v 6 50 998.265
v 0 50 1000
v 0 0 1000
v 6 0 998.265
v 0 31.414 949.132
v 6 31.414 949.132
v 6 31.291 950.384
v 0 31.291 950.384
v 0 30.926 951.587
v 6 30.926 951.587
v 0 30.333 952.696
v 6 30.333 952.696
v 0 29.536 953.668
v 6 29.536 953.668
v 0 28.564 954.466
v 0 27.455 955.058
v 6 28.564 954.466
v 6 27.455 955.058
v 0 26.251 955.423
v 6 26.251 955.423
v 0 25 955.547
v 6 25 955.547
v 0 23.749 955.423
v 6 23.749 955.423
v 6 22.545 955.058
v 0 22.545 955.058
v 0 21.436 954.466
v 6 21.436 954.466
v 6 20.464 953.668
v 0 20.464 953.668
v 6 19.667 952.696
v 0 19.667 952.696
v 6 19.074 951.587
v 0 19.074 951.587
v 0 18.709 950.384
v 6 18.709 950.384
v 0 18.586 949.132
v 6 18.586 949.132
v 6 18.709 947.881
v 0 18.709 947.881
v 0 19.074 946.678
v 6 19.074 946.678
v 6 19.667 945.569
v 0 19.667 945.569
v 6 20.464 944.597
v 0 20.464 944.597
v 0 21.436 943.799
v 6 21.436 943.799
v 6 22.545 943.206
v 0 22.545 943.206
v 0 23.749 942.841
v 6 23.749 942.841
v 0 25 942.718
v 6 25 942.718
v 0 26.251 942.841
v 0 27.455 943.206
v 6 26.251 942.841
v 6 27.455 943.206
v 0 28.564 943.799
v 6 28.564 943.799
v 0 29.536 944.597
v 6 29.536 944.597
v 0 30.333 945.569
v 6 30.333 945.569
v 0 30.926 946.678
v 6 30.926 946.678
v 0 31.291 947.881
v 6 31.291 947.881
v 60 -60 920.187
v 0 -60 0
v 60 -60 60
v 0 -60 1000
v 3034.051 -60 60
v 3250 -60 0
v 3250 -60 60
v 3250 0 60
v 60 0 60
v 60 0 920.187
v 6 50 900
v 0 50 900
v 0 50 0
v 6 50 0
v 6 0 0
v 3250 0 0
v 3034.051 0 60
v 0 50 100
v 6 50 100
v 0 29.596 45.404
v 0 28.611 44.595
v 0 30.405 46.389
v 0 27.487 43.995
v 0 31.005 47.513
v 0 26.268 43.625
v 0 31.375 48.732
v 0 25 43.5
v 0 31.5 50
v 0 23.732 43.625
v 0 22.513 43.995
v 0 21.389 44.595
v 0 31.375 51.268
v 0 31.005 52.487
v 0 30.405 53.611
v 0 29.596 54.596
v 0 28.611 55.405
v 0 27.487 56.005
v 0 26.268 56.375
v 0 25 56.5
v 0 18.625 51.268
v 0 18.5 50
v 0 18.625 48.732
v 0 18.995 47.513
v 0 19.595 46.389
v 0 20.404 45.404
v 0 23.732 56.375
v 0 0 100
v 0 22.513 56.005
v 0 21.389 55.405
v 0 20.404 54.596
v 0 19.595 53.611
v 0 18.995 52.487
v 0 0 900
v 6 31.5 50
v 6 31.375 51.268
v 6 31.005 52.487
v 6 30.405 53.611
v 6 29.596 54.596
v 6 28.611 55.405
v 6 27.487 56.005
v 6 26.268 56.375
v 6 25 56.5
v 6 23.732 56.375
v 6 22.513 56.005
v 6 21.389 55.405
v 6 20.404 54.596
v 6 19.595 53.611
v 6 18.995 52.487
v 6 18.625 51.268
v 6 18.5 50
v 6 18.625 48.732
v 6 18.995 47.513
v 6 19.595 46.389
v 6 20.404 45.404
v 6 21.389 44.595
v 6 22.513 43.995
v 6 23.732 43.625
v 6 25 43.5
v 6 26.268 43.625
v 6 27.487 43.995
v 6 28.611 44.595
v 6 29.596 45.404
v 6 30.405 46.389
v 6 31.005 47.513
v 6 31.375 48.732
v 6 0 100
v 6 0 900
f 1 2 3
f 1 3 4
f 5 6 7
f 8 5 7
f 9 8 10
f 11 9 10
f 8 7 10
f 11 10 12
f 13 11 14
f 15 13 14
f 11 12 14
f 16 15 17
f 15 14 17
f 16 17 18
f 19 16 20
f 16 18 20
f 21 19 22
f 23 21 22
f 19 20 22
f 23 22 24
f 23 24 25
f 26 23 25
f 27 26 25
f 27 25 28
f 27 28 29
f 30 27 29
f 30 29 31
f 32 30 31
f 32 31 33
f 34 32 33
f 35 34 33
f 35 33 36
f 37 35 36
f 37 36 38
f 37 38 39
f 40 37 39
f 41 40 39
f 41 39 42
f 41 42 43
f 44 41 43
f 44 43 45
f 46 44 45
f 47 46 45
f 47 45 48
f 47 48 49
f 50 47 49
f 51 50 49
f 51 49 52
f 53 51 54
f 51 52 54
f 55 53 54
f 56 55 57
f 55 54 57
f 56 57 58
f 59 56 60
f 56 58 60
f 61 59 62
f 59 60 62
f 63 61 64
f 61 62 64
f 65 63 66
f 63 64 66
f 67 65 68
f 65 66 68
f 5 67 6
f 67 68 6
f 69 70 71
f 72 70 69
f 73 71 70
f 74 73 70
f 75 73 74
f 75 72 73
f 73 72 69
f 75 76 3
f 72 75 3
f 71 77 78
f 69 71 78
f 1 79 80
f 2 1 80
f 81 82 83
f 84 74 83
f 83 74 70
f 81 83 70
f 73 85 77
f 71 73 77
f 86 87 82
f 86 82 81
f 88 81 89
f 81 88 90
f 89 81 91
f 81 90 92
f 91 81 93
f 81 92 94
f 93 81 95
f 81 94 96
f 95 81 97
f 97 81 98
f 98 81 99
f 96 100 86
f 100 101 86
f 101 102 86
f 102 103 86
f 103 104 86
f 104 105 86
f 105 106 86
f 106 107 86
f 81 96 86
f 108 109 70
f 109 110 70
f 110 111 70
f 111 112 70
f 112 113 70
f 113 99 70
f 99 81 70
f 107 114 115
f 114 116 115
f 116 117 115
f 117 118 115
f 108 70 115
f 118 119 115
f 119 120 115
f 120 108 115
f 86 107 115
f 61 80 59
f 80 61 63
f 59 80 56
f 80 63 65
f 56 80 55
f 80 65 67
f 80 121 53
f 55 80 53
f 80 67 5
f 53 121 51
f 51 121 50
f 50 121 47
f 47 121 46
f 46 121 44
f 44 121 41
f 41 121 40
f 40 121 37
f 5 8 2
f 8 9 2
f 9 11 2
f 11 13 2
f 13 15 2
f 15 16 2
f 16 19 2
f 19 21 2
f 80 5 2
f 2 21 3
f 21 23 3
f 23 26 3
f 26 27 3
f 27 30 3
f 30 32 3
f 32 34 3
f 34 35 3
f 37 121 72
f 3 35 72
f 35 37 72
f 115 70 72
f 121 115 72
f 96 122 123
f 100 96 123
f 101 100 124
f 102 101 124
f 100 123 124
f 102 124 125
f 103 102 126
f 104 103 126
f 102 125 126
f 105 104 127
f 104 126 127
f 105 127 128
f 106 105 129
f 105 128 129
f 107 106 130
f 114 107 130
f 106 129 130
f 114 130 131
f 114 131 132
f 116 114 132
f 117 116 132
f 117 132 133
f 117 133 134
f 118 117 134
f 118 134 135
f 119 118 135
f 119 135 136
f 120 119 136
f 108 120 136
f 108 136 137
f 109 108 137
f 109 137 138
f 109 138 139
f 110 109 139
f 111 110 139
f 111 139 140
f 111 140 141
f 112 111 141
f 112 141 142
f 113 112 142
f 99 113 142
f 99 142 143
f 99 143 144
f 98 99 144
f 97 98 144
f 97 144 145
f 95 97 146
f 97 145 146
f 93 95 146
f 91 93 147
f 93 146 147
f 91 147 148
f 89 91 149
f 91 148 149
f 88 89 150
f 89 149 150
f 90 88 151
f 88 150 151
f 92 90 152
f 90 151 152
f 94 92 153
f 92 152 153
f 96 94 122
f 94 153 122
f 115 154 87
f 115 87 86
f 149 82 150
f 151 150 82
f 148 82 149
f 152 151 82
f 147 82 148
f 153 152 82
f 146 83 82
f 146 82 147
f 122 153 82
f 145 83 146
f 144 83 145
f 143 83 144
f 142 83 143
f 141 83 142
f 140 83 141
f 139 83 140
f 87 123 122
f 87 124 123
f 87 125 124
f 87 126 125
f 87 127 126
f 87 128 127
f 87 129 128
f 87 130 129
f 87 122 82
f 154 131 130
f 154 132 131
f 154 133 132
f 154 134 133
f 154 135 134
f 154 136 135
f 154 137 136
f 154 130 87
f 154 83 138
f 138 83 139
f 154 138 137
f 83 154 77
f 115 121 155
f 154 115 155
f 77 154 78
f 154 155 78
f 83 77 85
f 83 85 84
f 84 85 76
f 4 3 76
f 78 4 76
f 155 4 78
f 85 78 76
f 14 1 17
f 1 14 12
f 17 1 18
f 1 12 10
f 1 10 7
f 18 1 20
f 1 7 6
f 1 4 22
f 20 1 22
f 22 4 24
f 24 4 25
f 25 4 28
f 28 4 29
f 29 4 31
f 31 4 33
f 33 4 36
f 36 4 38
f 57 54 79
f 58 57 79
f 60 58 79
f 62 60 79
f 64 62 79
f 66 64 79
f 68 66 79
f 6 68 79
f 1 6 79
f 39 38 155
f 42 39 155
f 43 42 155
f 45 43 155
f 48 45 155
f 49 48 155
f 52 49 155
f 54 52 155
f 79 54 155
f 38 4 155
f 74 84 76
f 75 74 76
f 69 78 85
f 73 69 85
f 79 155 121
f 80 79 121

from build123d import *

# Parameters (mm, degrees)
F1_DEPTH = 60
F2_W     = 6
F2_H     = 100
F3_DEPTH = 50
F5_DEPTH = 50
F6_R     = 6.414339
F7_DEPTH = 25
F8_R     = 6.5
F9_DEPTH = 25


with BuildPart() as f1:
    # F0 (on Front) → F1 (new body)
    with BuildSketch(Plane.XZ):
        Polygon((0, 1000), (0, 0), (3250, 0), (3250, 60), align=None)
        Polygon((3034.050519, 60), (60, 60), (60, 920.186919), align=None, mode=Mode.SUBTRACT)
    extrude(amount=F1_DEPTH)

    # F2 (on face) → F3 (join)
    with BuildSketch(Plane(origin=(0, 0, 0), x_dir=(-1, 0, 0), z_dir=(0, 1, 0))):
        with Locations((-3, 50)):
            Rectangle(F2_W, F2_H)
    extrude(amount=F3_DEPTH)

    # F4 (on face) → F5 (join)
    with BuildSketch(Plane(origin=(0, 0, 0), x_dir=(-1, 0, 0), z_dir=(0, 1, 0))):
        Polygon((0, 900), (0, 1000), (-6, 998.264615), (-6, 900), align=None)
    extrude(amount=F5_DEPTH)

    # F6 (on face) → F7 (cut)
    with BuildSketch(Plane.YZ.offset(6)):
        with Locations((25, 949.132308)):
            Circle(F6_R)
    extrude(amount=-F7_DEPTH, mode=Mode.SUBTRACT)

    # F8 (on face) → F9 (cut)
    with BuildSketch(Plane.YZ.offset(6)):
        with Locations((25, 50)):
            Circle(F8_R)
    extrude(amount=-F9_DEPTH, mode=Mode.SUBTRACT)


solid = f1.part
